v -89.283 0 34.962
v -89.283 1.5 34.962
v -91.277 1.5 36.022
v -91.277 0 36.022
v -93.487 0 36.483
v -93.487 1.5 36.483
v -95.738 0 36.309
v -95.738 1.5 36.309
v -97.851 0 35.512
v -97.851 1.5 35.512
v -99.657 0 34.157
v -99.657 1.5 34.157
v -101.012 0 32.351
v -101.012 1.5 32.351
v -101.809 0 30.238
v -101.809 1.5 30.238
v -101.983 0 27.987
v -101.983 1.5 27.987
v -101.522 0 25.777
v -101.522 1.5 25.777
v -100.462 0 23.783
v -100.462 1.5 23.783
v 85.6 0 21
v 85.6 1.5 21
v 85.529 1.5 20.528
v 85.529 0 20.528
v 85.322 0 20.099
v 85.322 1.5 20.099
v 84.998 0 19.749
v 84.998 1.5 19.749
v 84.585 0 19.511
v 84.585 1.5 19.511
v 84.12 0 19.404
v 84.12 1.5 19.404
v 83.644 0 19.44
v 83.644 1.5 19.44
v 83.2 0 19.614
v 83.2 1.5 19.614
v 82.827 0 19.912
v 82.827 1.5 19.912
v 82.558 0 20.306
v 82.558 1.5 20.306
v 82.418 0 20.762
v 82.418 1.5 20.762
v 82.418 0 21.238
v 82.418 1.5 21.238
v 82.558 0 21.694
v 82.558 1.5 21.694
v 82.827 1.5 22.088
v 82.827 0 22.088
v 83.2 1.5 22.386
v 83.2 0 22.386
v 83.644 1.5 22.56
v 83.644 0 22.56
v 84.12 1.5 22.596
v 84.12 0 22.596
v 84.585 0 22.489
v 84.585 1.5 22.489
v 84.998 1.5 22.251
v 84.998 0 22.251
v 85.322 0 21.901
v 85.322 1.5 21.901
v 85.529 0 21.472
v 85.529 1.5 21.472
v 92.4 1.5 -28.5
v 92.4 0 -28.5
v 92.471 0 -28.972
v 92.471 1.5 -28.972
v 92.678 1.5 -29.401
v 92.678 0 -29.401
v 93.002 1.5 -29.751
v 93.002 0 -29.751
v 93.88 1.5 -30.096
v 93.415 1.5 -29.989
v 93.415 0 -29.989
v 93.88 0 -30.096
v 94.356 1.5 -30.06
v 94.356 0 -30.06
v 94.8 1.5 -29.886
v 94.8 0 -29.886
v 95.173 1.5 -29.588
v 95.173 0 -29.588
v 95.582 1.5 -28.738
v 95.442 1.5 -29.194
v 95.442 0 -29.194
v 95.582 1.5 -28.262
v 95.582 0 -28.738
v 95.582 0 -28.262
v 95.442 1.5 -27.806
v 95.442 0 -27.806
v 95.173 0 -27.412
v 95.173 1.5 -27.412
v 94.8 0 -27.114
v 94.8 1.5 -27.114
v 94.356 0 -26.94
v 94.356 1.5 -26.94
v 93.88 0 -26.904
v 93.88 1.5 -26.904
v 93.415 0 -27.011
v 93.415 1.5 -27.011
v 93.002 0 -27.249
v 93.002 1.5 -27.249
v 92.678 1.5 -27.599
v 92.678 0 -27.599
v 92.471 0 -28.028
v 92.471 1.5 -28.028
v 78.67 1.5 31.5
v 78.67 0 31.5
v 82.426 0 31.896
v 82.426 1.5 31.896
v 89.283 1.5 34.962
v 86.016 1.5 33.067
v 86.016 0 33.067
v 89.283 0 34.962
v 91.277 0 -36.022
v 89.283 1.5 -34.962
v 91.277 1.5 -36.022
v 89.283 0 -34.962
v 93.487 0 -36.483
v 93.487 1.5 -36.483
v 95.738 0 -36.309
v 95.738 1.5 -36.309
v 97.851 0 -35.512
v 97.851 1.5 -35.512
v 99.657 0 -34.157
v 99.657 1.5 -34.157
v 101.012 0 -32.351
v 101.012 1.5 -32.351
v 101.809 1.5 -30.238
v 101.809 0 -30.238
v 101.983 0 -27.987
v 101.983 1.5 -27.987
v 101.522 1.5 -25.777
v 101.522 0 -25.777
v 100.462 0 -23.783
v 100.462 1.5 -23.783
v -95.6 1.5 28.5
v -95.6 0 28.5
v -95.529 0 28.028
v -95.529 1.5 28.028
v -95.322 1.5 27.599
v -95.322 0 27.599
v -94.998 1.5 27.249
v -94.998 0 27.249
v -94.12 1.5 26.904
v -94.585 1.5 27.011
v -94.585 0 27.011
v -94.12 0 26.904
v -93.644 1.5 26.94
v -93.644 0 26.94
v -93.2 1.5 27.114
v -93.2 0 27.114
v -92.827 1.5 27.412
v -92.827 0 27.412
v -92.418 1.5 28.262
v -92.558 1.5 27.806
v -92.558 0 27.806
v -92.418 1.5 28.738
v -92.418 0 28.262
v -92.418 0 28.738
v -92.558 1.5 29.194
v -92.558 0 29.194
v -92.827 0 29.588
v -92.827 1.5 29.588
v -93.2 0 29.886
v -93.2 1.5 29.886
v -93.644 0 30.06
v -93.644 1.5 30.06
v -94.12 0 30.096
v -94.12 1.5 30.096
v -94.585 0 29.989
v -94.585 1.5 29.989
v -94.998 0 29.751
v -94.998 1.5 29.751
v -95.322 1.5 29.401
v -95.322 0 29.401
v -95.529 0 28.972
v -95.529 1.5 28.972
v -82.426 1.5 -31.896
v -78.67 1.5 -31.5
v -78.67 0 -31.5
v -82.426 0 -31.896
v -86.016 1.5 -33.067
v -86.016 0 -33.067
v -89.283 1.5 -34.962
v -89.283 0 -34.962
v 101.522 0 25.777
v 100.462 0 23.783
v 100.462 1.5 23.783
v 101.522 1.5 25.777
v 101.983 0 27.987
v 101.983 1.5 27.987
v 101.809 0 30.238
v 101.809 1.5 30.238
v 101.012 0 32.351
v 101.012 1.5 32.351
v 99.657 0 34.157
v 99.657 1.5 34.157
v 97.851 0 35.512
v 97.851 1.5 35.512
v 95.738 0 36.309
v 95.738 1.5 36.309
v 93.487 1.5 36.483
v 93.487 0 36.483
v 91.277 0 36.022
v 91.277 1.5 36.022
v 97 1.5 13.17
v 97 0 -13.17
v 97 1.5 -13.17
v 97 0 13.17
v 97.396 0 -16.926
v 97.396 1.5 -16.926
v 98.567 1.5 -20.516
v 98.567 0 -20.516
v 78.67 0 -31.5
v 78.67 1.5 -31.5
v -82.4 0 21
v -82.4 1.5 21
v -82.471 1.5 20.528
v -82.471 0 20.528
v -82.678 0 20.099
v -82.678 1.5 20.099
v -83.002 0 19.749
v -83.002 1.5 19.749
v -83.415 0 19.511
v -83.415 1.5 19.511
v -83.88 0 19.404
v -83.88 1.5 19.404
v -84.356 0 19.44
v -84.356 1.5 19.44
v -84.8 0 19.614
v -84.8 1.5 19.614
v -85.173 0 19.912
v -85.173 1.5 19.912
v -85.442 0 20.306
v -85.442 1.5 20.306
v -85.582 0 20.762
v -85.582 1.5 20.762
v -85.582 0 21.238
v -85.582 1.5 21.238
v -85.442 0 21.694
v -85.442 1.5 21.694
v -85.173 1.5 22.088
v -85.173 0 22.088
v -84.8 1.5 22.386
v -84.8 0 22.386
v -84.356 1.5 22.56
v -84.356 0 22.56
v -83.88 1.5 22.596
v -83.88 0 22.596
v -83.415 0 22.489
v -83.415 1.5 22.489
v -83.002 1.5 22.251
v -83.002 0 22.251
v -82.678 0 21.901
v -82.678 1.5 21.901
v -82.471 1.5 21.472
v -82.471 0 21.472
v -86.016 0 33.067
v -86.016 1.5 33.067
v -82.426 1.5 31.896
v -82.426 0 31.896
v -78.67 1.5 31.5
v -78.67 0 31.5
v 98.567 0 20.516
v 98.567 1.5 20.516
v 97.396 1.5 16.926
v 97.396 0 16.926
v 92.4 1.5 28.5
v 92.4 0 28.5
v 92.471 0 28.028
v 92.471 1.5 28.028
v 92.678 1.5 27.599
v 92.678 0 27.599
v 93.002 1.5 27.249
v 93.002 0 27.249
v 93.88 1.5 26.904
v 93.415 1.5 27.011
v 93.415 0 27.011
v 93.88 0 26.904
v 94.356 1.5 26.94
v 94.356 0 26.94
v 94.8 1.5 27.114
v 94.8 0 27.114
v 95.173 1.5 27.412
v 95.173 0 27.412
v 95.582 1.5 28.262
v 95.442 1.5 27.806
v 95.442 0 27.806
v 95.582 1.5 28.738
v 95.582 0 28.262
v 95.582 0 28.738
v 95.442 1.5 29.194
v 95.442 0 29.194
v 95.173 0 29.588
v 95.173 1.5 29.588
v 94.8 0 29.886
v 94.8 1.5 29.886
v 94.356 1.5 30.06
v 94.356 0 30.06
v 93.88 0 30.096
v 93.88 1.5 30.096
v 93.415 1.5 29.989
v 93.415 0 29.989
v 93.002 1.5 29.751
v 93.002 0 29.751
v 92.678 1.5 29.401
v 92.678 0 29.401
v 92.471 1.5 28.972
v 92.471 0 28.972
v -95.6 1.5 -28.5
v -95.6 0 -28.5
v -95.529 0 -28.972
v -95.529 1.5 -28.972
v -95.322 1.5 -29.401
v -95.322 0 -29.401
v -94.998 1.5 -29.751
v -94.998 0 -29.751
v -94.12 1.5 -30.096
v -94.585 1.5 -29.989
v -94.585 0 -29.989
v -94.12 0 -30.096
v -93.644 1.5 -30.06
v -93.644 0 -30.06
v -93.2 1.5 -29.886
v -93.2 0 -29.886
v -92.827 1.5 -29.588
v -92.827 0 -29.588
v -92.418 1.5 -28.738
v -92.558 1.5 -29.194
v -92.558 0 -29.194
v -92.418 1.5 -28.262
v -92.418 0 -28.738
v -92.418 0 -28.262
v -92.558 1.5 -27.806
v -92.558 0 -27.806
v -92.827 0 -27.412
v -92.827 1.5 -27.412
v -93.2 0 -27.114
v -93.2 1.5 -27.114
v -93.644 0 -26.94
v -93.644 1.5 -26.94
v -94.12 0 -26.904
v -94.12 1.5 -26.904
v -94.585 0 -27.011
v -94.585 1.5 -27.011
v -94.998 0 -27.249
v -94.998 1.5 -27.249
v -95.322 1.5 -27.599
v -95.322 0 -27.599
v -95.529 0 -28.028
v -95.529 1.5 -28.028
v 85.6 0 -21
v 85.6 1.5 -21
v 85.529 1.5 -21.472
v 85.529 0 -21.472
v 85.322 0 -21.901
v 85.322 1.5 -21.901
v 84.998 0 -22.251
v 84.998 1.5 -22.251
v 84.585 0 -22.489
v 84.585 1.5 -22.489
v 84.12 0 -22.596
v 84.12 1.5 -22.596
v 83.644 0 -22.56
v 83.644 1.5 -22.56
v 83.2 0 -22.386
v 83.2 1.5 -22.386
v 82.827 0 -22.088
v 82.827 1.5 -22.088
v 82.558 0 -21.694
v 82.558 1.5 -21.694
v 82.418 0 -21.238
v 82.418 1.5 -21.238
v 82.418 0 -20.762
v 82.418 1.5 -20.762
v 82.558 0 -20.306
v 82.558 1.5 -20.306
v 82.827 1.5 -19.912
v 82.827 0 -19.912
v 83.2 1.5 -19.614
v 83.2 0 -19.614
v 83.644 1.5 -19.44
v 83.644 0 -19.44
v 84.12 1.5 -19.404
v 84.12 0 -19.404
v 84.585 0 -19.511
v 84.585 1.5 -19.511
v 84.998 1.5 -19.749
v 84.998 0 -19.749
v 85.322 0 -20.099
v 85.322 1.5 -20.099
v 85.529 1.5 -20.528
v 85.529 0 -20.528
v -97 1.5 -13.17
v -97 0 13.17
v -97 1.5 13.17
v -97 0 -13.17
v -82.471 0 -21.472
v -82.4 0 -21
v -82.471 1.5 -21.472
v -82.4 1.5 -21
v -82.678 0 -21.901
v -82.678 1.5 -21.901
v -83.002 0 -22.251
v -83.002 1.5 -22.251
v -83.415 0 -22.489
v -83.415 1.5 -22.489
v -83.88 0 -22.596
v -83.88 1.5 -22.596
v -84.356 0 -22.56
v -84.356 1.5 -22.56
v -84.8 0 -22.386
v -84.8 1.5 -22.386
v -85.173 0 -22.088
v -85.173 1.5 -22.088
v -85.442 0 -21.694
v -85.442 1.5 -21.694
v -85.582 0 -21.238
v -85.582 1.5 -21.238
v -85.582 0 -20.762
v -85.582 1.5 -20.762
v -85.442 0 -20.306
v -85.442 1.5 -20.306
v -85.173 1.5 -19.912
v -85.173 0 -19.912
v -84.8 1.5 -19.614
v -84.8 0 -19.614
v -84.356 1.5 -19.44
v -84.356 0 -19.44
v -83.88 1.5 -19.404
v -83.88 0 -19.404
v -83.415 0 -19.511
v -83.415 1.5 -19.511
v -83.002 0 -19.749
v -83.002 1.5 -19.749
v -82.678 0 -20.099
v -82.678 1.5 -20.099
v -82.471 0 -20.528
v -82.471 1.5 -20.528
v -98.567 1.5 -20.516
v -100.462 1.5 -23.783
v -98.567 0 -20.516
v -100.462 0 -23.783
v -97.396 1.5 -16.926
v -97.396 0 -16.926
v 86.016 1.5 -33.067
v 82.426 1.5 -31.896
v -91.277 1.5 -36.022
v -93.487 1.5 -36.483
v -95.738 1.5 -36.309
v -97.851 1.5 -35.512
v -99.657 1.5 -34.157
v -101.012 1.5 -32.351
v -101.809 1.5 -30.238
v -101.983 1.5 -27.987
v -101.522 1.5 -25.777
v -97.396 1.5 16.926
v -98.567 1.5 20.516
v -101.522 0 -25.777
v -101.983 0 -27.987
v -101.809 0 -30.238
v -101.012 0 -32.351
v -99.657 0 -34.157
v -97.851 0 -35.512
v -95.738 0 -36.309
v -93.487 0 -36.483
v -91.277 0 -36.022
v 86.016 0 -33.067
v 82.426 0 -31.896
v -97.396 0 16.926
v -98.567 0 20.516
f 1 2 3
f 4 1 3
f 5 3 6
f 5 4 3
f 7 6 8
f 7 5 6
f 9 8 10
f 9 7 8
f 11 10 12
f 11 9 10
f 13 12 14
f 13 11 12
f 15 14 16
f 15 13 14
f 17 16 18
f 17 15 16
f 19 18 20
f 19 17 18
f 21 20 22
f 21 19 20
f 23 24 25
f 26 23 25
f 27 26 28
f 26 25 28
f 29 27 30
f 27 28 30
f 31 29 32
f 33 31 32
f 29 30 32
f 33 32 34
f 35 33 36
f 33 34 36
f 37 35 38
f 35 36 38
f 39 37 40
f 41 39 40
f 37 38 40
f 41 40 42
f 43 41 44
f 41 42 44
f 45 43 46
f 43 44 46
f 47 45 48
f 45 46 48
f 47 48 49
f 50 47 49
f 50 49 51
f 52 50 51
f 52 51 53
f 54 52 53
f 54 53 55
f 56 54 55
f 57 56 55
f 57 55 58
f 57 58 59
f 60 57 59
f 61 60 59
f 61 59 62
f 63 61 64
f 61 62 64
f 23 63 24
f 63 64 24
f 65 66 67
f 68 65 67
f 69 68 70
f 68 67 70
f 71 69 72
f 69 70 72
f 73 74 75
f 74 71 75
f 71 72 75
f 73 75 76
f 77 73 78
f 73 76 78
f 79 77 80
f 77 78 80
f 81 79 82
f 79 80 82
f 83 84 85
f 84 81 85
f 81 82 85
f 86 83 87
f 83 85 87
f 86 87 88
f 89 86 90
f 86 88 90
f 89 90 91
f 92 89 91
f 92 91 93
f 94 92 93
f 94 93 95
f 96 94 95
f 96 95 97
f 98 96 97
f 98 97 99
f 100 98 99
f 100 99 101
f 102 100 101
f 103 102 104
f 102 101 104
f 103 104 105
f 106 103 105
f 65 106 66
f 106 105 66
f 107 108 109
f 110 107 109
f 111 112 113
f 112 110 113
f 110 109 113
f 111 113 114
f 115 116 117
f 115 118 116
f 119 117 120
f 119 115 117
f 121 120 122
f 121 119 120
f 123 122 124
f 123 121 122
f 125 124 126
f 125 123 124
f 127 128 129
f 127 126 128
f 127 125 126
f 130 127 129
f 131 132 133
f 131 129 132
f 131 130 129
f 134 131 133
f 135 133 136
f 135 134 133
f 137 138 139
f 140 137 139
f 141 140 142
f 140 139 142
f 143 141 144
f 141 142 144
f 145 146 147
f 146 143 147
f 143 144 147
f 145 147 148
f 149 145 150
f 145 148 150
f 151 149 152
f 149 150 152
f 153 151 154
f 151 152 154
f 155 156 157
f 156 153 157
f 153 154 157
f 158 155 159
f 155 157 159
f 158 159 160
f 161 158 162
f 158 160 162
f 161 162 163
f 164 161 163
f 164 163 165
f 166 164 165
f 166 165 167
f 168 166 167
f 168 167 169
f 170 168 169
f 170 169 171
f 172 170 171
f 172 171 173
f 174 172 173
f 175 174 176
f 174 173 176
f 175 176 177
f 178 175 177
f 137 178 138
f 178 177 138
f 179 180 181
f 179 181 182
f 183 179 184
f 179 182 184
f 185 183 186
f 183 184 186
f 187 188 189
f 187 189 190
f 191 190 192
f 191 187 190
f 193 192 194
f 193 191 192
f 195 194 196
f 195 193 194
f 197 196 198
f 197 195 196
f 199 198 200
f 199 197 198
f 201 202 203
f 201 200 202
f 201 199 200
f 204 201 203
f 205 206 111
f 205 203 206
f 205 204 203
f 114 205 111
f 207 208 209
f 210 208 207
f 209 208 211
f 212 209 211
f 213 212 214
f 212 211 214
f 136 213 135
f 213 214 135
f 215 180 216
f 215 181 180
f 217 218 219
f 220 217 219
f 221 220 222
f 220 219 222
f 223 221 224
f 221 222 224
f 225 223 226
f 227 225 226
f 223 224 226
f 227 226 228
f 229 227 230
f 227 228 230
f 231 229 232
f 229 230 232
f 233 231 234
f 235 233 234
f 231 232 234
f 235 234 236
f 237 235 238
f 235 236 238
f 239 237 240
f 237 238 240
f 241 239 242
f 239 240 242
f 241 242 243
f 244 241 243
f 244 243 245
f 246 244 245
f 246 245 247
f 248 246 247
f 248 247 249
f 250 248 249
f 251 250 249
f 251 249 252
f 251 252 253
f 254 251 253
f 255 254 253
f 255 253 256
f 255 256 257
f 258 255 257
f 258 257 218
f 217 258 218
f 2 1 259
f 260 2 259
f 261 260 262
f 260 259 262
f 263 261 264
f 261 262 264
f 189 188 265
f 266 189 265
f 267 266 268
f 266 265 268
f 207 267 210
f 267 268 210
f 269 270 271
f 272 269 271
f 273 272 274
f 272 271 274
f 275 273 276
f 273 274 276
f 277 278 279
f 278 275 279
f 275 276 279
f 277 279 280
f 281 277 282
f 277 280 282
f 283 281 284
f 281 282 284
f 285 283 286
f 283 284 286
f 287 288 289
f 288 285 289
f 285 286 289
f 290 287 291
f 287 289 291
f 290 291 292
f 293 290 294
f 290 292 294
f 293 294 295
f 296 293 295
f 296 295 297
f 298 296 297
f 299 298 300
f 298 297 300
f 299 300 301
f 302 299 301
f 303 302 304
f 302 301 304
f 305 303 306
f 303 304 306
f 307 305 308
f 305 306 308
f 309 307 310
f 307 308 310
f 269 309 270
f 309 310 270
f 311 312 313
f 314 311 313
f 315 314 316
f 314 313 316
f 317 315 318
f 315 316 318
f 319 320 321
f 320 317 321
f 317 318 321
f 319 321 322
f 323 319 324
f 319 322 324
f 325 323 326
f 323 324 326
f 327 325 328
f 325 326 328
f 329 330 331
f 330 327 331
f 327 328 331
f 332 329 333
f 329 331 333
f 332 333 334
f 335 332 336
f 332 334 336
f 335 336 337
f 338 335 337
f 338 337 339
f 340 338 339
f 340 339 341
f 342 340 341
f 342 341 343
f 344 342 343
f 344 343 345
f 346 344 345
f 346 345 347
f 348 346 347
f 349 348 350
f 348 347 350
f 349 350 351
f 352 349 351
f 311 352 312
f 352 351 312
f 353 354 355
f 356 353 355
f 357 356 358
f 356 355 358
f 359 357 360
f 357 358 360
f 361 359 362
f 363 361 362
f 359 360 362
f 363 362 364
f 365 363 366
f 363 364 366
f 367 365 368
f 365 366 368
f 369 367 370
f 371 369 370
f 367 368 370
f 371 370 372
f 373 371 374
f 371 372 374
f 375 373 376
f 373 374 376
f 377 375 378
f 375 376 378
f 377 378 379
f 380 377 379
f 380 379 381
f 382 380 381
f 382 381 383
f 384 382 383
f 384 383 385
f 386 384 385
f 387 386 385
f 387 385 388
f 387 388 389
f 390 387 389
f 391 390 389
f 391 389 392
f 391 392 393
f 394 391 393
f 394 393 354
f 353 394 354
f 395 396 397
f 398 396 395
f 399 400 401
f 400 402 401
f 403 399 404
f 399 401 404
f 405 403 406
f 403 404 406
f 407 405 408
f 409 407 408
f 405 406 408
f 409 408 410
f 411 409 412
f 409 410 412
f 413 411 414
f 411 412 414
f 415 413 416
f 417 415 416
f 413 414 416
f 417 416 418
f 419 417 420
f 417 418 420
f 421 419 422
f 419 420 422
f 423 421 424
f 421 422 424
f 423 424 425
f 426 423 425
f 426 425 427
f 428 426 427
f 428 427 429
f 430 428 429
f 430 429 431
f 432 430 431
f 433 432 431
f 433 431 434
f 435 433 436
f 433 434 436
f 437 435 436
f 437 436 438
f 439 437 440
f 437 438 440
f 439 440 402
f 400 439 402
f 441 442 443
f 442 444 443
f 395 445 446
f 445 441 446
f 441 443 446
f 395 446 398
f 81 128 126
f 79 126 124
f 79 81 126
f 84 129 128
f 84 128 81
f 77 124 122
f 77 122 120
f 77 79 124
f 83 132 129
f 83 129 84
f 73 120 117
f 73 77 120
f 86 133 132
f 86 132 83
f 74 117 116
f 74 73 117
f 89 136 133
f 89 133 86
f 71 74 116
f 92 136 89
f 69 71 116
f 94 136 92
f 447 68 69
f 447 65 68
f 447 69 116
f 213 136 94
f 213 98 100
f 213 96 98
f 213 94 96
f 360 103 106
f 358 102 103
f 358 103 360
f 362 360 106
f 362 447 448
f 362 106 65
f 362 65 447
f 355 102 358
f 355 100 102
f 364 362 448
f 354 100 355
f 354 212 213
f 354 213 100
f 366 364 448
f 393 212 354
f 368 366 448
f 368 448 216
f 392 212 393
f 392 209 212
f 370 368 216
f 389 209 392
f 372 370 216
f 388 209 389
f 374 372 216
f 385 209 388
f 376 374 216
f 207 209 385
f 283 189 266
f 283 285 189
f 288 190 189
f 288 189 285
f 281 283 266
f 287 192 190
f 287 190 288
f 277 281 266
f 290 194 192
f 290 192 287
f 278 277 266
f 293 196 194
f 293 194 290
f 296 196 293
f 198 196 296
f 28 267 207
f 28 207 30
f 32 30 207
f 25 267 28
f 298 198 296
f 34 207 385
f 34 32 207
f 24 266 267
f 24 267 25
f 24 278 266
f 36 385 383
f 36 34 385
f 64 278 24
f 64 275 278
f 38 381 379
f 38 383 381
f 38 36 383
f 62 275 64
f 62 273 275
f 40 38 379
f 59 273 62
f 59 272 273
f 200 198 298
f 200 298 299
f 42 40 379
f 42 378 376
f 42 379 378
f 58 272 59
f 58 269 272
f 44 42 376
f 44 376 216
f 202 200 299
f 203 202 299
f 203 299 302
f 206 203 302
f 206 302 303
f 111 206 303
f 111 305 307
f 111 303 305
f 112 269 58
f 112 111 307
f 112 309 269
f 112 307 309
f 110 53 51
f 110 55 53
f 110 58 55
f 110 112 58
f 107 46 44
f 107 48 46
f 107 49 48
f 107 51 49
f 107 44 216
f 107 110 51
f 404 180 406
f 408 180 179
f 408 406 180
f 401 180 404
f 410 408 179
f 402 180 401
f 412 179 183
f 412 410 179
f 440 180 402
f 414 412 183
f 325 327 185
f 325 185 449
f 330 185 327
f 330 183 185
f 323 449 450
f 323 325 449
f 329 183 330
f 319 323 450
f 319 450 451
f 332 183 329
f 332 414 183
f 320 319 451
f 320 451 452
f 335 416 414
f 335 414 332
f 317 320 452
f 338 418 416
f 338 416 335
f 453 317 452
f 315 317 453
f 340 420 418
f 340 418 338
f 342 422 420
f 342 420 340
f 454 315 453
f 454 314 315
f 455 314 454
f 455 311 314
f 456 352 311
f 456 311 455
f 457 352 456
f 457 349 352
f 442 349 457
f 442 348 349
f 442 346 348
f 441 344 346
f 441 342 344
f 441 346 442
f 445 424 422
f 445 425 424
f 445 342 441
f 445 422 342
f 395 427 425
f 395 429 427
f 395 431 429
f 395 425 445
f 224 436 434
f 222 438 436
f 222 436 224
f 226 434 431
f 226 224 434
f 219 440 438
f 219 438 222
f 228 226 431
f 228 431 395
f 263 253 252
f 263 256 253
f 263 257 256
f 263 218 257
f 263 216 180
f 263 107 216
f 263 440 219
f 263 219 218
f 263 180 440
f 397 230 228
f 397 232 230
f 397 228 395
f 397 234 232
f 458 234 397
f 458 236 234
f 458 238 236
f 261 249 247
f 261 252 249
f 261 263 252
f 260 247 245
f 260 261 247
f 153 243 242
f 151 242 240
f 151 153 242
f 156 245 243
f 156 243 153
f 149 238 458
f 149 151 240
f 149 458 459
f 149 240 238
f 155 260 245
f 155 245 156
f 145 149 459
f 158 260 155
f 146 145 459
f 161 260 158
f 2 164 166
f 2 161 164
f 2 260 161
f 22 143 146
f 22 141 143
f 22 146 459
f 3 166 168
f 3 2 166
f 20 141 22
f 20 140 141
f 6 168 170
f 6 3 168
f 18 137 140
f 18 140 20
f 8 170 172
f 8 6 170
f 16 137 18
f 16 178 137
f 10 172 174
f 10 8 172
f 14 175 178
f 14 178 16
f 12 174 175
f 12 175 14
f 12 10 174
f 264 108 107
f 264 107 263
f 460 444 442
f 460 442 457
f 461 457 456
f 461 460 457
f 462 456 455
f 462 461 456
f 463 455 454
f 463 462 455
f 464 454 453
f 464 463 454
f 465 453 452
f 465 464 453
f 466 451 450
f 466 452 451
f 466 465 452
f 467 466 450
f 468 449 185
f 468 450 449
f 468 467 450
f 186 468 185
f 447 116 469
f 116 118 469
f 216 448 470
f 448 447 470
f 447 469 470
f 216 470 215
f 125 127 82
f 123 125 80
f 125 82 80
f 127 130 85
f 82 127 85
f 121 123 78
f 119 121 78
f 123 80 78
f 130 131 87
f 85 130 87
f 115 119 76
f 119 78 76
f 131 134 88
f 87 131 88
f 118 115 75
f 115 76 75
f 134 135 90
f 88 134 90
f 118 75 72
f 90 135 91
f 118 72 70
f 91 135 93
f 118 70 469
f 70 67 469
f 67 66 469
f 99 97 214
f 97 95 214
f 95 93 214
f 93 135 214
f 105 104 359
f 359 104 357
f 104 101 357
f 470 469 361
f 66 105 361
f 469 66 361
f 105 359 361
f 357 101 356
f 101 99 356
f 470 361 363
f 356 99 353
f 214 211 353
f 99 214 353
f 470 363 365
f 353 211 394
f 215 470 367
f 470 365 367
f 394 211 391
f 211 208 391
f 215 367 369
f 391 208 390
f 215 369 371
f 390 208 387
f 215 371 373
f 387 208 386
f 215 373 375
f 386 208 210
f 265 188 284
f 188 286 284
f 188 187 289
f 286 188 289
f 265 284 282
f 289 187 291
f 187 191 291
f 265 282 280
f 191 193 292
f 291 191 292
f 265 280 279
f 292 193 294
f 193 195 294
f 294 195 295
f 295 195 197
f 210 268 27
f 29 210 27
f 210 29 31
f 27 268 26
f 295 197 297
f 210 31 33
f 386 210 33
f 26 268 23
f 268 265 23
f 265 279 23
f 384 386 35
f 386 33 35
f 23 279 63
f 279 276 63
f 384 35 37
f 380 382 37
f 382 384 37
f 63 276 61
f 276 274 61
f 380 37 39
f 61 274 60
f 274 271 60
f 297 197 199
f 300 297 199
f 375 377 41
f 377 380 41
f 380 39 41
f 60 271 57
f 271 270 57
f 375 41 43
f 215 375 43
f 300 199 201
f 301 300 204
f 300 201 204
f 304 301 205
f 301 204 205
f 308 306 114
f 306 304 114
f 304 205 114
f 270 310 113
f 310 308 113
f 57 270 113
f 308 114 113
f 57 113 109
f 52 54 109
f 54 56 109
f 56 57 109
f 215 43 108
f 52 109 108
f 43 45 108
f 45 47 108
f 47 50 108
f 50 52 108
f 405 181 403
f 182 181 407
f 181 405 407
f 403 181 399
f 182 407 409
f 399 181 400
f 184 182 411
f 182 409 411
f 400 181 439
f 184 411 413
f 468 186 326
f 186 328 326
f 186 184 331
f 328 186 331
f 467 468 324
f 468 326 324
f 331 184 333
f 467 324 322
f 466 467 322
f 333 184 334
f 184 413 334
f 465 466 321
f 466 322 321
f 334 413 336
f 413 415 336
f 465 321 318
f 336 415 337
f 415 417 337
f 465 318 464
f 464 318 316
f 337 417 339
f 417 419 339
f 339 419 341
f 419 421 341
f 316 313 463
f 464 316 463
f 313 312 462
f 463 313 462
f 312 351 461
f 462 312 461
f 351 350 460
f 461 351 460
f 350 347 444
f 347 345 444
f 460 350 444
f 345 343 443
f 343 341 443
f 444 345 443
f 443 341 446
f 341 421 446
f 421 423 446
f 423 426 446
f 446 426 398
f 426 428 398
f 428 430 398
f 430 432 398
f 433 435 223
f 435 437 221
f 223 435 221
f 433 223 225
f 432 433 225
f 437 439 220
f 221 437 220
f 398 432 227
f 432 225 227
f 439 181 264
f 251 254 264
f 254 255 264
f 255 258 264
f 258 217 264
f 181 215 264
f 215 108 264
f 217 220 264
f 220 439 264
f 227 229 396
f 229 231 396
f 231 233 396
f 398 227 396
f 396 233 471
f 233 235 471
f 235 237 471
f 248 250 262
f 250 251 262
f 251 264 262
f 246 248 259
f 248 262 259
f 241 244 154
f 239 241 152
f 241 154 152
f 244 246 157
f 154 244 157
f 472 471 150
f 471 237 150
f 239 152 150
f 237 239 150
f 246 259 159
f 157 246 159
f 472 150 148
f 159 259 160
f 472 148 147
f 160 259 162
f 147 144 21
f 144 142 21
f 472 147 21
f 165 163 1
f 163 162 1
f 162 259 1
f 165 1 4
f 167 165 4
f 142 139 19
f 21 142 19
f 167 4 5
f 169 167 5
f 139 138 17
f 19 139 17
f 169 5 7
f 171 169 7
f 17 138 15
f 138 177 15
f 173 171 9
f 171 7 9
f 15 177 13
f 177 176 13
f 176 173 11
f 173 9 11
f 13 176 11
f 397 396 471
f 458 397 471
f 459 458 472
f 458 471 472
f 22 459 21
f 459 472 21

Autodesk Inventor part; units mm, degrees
ref_plane "YZ Plane" through (0, 0, 0) normal (1, 0, 0) x (0, 1, 0)
ref_plane "XZ Plane" through (0, 0, 0) normal (0, 1, 0) x (-1, 0, 0)
ref_plane "XY Plane" through (0, 0, 0) normal (0, 0, 1) x (1, 0, 0)
sketch "Sketch2" plane through (0, 0, 0) normal (0, 1, 0) x (-1, 0, 0)
  line L0 (-94, 28.5) -> (94, 28.5) construction
  line L1 (94, 28.5) -> (94, -28.5) construction
  line L2 (94, -28.5) -> (-94, -28.5) construction
  line L3 (-94, -28.5) -> (-94, 28.5) construction
  line L4 (-94, 28.5) -> (94, -28.5) construction
  line L5 (94, 28.5) -> (-94, -28.5) construction
  line L6 (78.6703, -31.5) -> (-78.6703, -31.5)
  line L7 (-97, -13.1703) -> (-97, 13.1703)
  line L8 (-78.6703, 31.5) -> (78.6703, 31.5)
  line L9 (97, 13.1703) -> (97, -13.1703)
  arc A0 (89.2832, -34.9615) -> (100.4615, -23.7832) centre (94, -28.5) ccw
  arc A1 (100.4615, 23.7832) -> (89.2832, 34.9615) centre (94, 28.5) ccw
  arc A2 (-89.2832, 34.9615) -> (-100.4615, 23.7832) centre (-94, 28.5) ccw
  arc A3 (-100.4615, -23.7832) -> (-89.2832, -34.9615) centre (-94, -28.5) ccw
  arc A4 (89.2832, -34.9615) -> (78.6703, -31.5) centre (78.6703, -49.5) ccw
  arc A5 (97, -13.1703) -> (100.4615, -23.7832) centre (115, -13.1703) ccw
  arc A6 (100.4615, 23.7832) -> (97, 13.1703) centre (115, 13.1703) ccw
  arc A7 (78.6703, 31.5) -> (89.2832, 34.9615) centre (78.6703, 49.5) ccw
  arc A8 (-89.2832, 34.9615) -> (-78.6703, 31.5) centre (-78.6703, 49.5) ccw
  arc A9 (-97, 13.1703) -> (-100.4615, 23.7832) centre (-115, 13.1703) ccw
  arc A10 (-100.4615, -23.7832) -> (-97, -13.1703) centre (-115, -13.1703) ccw
  arc A11 (-78.6703, -31.5) -> (-89.2832, -34.9615) centre (-78.6703, -49.5) ccw
  circle A12 centre (94, -28.5) radius 1.6
  circle A13 centre (94, 28.5) radius 1.6
  circle A14 centre (-94, -28.5) radius 1.6
  circle A15 centre (-94, 28.5) radius 1.6
  circle A16 centre (94, -28.5) radius 3 construction
  circle A17 centre (94, 28.5) radius 3 construction
  circle A18 centre (-94, 28.5) radius 3 construction
  circle A19 centre (-94, -28.5) radius 3 construction
  point P0 (0, 0)
  point P1 (86.5838, -31.5)
  point P2 (-86.5838, -31.5)
  point P3 (-97, -21.0838)
  point P4 (-97, 21.0838)
  point P5 (-86.5838, 31.5)
  point P6 (86.5838, 31.5)
  point P7 (97, 21.0838)
  point P8 (97, -21.0838)
  dimension "d6" = 3
  dimension "d7" = 3
  dimension "d8" = 3
  dimension "d9" = 3
  dimension "d10" = 8
  dimension "d11" = 18
  dimension "d14" = 3.2
  dimension "d15" = 63
  dimension "d16" = 194
  dimension "d17" = 6
extrude "Extrusion1" add sketch "Sketch2" along normal blind 1.5
sketch "Sketch3" plane through (0, 1.5, 0) normal (0, 1, 0) x (1, 0, 0)
  line L0 (84, -21) -> (-84, -21) construction
  line L1 (-84, -21) -> (-84, 21) construction
  line L2 (-84, 21) -> (84, 21) construction
  line L3 (84, 21) -> (84, -21) construction
  line L4 (84, -21) -> (-84, 21) construction
  line L5 (-84, -21) -> (84, 21) construction
  circle A0 centre (-84, 21) radius 1.6
  circle A1 centre (-84, -21) radius 1.6
  circle A2 centre (84, -21) radius 1.6
  circle A3 centre (84, 21) radius 1.6
  point P0 (0, 0)
  dimension "d18" = 168
  dimension "d19" = 42
  dimension "d20" = 3.2
extrude "Extrusion2" cut sketch "Sketch3" against normal through all
equation "\"d7\" = d6"
equation "\"d8\" = d6"
equation "\"d9\" = d8"
equation "\"d21\" = d20"
properties part number "BaseLayer"
